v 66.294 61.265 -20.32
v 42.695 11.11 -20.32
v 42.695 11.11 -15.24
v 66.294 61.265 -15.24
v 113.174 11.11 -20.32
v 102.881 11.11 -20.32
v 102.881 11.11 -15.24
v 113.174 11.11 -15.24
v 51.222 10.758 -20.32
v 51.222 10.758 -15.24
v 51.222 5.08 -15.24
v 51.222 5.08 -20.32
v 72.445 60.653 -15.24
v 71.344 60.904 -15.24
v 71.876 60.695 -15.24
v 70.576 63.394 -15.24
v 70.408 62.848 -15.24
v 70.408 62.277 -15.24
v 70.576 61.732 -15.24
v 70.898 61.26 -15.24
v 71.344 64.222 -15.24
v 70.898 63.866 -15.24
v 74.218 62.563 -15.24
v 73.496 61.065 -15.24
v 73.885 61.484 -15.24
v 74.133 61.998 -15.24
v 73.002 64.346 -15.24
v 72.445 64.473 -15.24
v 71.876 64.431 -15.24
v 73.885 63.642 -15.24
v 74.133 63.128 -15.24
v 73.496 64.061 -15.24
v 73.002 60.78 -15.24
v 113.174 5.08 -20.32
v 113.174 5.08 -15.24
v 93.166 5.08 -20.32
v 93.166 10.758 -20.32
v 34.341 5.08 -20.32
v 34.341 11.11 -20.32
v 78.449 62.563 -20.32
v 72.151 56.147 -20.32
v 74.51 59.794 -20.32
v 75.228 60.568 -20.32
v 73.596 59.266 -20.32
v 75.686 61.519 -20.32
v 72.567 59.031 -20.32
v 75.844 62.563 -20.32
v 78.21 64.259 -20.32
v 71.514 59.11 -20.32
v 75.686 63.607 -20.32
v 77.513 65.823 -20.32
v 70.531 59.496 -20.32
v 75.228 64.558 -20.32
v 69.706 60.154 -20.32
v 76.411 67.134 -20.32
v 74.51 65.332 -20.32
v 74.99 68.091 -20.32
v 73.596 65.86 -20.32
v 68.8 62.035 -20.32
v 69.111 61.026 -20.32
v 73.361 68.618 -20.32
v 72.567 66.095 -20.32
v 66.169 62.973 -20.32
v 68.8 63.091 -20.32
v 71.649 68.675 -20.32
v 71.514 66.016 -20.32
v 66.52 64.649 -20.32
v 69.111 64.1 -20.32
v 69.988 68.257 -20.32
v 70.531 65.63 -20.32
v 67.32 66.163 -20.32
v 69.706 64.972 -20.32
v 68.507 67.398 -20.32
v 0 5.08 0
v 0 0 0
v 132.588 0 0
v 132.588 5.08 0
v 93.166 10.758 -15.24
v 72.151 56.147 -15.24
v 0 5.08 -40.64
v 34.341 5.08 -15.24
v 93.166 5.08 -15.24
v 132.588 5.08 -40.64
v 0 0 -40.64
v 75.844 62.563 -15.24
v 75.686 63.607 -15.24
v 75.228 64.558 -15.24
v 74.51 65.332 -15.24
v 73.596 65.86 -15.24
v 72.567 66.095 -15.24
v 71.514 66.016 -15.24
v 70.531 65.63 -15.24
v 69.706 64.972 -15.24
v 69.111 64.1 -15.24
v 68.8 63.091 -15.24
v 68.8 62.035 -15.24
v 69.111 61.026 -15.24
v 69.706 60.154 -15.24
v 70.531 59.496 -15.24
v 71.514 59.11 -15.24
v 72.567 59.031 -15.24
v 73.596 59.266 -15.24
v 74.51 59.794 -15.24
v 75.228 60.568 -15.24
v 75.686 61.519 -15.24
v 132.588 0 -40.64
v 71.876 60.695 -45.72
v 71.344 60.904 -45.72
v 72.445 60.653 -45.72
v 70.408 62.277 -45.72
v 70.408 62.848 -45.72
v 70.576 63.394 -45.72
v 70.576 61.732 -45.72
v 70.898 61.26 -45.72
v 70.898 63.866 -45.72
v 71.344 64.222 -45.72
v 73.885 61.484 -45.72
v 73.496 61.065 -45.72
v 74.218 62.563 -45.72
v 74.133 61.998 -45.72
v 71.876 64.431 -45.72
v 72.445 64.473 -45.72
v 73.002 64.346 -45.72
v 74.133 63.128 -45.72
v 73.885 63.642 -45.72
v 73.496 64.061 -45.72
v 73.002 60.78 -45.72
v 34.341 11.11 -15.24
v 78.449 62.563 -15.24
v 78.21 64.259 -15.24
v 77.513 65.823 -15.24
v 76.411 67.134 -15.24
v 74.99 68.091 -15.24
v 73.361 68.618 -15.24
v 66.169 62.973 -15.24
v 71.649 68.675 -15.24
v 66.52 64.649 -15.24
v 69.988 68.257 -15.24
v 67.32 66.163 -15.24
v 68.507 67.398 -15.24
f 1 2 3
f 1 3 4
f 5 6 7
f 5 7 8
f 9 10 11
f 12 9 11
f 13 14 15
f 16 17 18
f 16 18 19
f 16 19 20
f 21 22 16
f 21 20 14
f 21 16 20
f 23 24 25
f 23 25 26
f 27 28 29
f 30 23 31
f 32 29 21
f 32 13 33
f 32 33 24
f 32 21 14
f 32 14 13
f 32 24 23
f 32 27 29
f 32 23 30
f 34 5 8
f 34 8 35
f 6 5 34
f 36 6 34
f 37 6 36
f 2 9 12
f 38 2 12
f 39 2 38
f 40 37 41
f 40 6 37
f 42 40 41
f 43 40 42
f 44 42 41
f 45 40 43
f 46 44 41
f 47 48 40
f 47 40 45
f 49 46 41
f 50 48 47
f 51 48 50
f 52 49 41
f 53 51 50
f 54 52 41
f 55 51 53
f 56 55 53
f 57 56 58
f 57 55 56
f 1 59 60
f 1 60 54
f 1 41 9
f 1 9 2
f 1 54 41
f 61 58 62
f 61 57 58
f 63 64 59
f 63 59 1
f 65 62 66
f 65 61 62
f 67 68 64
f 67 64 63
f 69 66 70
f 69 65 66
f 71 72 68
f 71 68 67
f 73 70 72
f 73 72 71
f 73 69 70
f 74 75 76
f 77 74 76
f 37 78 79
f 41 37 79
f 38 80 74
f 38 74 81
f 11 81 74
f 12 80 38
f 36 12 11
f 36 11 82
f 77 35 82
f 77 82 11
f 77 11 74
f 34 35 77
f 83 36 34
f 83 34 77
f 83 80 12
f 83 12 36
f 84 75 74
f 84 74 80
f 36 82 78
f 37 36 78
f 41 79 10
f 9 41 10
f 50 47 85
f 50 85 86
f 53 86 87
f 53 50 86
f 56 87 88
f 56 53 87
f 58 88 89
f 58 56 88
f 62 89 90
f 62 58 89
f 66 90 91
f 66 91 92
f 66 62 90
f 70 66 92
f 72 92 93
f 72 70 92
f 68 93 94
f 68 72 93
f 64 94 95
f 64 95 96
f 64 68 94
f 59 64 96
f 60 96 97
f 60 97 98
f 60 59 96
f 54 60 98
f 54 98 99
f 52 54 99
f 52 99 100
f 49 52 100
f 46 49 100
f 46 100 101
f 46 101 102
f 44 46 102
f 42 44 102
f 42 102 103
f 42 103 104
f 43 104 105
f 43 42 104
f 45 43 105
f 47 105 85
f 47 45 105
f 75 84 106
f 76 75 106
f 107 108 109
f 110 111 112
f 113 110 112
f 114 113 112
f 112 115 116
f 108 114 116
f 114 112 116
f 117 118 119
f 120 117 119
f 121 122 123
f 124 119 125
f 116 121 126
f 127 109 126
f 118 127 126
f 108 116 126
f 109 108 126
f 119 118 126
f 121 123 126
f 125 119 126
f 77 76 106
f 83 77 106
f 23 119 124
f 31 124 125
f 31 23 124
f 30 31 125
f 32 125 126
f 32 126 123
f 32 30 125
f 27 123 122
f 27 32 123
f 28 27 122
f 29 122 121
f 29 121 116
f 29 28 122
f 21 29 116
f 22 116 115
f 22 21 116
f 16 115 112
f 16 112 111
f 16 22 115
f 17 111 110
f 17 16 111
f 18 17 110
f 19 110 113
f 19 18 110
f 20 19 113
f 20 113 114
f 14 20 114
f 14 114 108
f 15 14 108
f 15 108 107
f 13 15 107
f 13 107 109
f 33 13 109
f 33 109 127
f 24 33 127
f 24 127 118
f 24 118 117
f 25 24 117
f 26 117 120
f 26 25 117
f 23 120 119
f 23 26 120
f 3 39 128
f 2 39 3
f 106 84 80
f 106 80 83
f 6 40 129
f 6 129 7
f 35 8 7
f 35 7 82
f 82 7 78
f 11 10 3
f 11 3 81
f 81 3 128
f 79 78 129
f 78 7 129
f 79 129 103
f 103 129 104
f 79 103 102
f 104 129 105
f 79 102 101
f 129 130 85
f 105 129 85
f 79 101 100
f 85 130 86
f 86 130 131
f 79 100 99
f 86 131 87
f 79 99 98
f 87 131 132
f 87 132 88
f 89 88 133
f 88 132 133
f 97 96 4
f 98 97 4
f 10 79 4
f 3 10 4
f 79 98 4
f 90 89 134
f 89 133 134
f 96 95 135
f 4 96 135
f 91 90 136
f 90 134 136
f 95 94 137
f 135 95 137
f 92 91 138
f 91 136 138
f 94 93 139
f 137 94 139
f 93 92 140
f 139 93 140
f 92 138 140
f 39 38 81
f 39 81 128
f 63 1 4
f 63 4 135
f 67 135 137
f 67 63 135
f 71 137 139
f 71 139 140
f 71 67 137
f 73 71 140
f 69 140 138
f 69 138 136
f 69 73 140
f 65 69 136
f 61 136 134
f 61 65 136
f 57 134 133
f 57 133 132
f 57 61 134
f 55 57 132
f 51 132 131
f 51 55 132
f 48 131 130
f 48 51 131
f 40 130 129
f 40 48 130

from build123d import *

# Parameters (mm, degrees)
SKETCH3_W           = 132.588
SKETCH3_H           = 40.64
BOSS_EXTRUDE2_DEPTH = 5.08
SKETCH4_R           = 3.54179385
BOSS_EXTRUDE3_DEPTH = 5.08
CUT_EXTRUDE1_DEPTH  = 5.08
SKETCH6_R           = 1.915721575
BOSS_EXTRUDE4_DEPTH = 30.48


with BuildPart() as part:
    # Sketch3 → Boss-Extrude2 (new body)
    with BuildSketch(Plane(origin=(0, 0, 0), x_dir=(1, 0, 0), z_dir=(0, 1, 0))):
        with Locations((66.294, 20.32)):
            Rectangle(SKETCH3_W, SKETCH3_H)
    extrude(amount=BOSS_EXTRUDE2_DEPTH)

    # Sketch4 → Boss-Extrude3 (add)
    with BuildSketch(Plane.XY.offset(-20.32)):
        with BuildLine():
            Line((42.695281609, 5.08), (34.340990791, 5.08))
            Line((34.340990791, 5.08), (34.340990791, 11.109607591))
            Line((34.340990791, 11.109607591), (42.695281609, 11.109607591))
            Line((42.695281609, 11.109607591), (66.294, 61.264635576))
            ThreePointArc((66.294, 61.264635576), (71.649082672, 68.674805636), (78.448554806, 62.562955717))
            Line((78.448554806, 62.562955717), (102.880626177, 11.109607591))
            Line((102.880626177, 11.109607591), (113.174490492, 11.109607591))
            Line((113.174490492, 11.109607591), (113.174490492, 5.08))
            Line((113.174490492, 5.08), (42.695281609, 5.08))
        make_face()
        with Locations((72.301935695, 62.562955717)):
            Circle(SKETCH4_R, mode=Mode.SUBTRACT)
    extrude(amount=BOSS_EXTRUDE3_DEPTH)

    # Sketch5 → Cut-Extrude1 (cut)
    with BuildSketch(Plane.XY.offset(-15.24)):
        Polygon((72.150616243, 56.147034971), (51.221825845, 10.758259087), (51.221825845, 5.08), (93.165533351, 5.08), (93.165533351, 10.758259087), align=None)
    extrude(amount=-CUT_EXTRUDE1_DEPTH, mode=Mode.SUBTRACT)


with BuildPart() as body_2:
    # Sketch6 → Boss-Extrude4 (new body)
    with BuildSketch(Plane.XY.offset(-15.24)):
        with Locations((72.301935695, 62.562955717)):
            Circle(SKETCH6_R)
    extrude(amount=-BOSS_EXTRUDE4_DEPTH)


solid = Compound([part.part, body_2.part])
